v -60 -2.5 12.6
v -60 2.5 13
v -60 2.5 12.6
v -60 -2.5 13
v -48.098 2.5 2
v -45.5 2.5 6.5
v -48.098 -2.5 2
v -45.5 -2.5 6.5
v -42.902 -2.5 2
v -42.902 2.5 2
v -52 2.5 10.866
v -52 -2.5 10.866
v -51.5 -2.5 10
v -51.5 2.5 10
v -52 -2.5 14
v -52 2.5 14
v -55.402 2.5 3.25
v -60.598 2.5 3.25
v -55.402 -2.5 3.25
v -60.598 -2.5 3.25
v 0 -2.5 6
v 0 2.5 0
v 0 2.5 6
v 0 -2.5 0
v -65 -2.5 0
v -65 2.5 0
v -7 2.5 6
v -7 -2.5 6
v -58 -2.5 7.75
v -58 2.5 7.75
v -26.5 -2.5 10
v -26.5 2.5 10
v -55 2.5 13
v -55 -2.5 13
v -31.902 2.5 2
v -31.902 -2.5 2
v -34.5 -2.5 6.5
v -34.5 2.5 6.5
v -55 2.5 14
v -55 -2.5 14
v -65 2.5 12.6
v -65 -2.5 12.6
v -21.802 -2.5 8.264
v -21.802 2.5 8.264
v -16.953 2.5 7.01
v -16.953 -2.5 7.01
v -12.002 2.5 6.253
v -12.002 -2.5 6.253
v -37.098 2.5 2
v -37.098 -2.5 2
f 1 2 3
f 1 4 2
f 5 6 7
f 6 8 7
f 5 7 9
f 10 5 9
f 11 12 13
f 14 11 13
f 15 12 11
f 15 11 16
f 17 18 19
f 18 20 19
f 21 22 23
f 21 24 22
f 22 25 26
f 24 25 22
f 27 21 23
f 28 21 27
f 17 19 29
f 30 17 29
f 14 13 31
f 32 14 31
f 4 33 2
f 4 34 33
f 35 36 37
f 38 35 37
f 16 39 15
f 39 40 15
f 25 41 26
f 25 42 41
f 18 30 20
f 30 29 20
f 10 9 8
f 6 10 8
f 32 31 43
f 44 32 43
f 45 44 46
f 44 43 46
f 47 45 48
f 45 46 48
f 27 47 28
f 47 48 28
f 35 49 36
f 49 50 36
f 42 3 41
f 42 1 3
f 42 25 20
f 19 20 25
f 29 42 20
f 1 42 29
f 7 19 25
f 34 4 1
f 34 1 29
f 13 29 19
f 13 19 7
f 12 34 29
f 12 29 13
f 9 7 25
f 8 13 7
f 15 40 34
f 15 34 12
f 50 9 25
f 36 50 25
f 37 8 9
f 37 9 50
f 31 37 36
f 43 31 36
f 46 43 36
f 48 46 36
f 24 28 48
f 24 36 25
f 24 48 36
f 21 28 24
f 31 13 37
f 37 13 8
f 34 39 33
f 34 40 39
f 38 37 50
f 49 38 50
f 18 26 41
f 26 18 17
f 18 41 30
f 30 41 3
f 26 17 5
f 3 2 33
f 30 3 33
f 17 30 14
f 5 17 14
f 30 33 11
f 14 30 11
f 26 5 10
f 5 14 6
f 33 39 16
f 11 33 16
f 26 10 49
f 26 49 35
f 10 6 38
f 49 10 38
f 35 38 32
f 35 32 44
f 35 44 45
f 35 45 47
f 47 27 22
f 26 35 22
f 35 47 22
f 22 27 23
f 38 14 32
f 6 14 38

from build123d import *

# Parameters (mm, degrees)
PAD_DEPTH = 2.5


with BuildPart() as part:
    # Sketch → Pad (new body, symmetric)
    with BuildSketch(Plane.XZ):
        with BuildLine():
            Line((0, 0), (0, 6))
            Line((0, 6), (-7, 6))
            ThreePointArc((-26.5, 10), (-16.953015, 7.010304), (-7, 6))
            Line((-51.5, 10), (-26.5, 10))
            Line((-52, 10.866025), (-51.5, 10))
            Line((-52, 10.866025), (-52, 14))
            Line((-55, 14), (-52, 14))
            Line((-55, 14), (-55, 13))
            Line((-55, 13), (-60, 13))
            Line((-60, 13), (-60, 12.6))
            Line((-60, 12.6), (-65, 12.6))
            Line((-65, 12.6), (-65, 0))
            Line((-65, 0), (0, 0))
        make_face()
        Polygon((-42.901924, 2), (-45.5, 6.5), (-48.098076, 2), align=None, mode=Mode.SUBTRACT)
        Polygon((-34.5, 6.5), (-37.098076, 2), (-31.901924, 2), align=None, mode=Mode.SUBTRACT)
        Polygon((-55.401924, 3.25), (-58, 7.75), (-60.598076, 3.25), align=None, mode=Mode.SUBTRACT)
    extrude(amount=PAD_DEPTH, both=True)


solid = part.part
